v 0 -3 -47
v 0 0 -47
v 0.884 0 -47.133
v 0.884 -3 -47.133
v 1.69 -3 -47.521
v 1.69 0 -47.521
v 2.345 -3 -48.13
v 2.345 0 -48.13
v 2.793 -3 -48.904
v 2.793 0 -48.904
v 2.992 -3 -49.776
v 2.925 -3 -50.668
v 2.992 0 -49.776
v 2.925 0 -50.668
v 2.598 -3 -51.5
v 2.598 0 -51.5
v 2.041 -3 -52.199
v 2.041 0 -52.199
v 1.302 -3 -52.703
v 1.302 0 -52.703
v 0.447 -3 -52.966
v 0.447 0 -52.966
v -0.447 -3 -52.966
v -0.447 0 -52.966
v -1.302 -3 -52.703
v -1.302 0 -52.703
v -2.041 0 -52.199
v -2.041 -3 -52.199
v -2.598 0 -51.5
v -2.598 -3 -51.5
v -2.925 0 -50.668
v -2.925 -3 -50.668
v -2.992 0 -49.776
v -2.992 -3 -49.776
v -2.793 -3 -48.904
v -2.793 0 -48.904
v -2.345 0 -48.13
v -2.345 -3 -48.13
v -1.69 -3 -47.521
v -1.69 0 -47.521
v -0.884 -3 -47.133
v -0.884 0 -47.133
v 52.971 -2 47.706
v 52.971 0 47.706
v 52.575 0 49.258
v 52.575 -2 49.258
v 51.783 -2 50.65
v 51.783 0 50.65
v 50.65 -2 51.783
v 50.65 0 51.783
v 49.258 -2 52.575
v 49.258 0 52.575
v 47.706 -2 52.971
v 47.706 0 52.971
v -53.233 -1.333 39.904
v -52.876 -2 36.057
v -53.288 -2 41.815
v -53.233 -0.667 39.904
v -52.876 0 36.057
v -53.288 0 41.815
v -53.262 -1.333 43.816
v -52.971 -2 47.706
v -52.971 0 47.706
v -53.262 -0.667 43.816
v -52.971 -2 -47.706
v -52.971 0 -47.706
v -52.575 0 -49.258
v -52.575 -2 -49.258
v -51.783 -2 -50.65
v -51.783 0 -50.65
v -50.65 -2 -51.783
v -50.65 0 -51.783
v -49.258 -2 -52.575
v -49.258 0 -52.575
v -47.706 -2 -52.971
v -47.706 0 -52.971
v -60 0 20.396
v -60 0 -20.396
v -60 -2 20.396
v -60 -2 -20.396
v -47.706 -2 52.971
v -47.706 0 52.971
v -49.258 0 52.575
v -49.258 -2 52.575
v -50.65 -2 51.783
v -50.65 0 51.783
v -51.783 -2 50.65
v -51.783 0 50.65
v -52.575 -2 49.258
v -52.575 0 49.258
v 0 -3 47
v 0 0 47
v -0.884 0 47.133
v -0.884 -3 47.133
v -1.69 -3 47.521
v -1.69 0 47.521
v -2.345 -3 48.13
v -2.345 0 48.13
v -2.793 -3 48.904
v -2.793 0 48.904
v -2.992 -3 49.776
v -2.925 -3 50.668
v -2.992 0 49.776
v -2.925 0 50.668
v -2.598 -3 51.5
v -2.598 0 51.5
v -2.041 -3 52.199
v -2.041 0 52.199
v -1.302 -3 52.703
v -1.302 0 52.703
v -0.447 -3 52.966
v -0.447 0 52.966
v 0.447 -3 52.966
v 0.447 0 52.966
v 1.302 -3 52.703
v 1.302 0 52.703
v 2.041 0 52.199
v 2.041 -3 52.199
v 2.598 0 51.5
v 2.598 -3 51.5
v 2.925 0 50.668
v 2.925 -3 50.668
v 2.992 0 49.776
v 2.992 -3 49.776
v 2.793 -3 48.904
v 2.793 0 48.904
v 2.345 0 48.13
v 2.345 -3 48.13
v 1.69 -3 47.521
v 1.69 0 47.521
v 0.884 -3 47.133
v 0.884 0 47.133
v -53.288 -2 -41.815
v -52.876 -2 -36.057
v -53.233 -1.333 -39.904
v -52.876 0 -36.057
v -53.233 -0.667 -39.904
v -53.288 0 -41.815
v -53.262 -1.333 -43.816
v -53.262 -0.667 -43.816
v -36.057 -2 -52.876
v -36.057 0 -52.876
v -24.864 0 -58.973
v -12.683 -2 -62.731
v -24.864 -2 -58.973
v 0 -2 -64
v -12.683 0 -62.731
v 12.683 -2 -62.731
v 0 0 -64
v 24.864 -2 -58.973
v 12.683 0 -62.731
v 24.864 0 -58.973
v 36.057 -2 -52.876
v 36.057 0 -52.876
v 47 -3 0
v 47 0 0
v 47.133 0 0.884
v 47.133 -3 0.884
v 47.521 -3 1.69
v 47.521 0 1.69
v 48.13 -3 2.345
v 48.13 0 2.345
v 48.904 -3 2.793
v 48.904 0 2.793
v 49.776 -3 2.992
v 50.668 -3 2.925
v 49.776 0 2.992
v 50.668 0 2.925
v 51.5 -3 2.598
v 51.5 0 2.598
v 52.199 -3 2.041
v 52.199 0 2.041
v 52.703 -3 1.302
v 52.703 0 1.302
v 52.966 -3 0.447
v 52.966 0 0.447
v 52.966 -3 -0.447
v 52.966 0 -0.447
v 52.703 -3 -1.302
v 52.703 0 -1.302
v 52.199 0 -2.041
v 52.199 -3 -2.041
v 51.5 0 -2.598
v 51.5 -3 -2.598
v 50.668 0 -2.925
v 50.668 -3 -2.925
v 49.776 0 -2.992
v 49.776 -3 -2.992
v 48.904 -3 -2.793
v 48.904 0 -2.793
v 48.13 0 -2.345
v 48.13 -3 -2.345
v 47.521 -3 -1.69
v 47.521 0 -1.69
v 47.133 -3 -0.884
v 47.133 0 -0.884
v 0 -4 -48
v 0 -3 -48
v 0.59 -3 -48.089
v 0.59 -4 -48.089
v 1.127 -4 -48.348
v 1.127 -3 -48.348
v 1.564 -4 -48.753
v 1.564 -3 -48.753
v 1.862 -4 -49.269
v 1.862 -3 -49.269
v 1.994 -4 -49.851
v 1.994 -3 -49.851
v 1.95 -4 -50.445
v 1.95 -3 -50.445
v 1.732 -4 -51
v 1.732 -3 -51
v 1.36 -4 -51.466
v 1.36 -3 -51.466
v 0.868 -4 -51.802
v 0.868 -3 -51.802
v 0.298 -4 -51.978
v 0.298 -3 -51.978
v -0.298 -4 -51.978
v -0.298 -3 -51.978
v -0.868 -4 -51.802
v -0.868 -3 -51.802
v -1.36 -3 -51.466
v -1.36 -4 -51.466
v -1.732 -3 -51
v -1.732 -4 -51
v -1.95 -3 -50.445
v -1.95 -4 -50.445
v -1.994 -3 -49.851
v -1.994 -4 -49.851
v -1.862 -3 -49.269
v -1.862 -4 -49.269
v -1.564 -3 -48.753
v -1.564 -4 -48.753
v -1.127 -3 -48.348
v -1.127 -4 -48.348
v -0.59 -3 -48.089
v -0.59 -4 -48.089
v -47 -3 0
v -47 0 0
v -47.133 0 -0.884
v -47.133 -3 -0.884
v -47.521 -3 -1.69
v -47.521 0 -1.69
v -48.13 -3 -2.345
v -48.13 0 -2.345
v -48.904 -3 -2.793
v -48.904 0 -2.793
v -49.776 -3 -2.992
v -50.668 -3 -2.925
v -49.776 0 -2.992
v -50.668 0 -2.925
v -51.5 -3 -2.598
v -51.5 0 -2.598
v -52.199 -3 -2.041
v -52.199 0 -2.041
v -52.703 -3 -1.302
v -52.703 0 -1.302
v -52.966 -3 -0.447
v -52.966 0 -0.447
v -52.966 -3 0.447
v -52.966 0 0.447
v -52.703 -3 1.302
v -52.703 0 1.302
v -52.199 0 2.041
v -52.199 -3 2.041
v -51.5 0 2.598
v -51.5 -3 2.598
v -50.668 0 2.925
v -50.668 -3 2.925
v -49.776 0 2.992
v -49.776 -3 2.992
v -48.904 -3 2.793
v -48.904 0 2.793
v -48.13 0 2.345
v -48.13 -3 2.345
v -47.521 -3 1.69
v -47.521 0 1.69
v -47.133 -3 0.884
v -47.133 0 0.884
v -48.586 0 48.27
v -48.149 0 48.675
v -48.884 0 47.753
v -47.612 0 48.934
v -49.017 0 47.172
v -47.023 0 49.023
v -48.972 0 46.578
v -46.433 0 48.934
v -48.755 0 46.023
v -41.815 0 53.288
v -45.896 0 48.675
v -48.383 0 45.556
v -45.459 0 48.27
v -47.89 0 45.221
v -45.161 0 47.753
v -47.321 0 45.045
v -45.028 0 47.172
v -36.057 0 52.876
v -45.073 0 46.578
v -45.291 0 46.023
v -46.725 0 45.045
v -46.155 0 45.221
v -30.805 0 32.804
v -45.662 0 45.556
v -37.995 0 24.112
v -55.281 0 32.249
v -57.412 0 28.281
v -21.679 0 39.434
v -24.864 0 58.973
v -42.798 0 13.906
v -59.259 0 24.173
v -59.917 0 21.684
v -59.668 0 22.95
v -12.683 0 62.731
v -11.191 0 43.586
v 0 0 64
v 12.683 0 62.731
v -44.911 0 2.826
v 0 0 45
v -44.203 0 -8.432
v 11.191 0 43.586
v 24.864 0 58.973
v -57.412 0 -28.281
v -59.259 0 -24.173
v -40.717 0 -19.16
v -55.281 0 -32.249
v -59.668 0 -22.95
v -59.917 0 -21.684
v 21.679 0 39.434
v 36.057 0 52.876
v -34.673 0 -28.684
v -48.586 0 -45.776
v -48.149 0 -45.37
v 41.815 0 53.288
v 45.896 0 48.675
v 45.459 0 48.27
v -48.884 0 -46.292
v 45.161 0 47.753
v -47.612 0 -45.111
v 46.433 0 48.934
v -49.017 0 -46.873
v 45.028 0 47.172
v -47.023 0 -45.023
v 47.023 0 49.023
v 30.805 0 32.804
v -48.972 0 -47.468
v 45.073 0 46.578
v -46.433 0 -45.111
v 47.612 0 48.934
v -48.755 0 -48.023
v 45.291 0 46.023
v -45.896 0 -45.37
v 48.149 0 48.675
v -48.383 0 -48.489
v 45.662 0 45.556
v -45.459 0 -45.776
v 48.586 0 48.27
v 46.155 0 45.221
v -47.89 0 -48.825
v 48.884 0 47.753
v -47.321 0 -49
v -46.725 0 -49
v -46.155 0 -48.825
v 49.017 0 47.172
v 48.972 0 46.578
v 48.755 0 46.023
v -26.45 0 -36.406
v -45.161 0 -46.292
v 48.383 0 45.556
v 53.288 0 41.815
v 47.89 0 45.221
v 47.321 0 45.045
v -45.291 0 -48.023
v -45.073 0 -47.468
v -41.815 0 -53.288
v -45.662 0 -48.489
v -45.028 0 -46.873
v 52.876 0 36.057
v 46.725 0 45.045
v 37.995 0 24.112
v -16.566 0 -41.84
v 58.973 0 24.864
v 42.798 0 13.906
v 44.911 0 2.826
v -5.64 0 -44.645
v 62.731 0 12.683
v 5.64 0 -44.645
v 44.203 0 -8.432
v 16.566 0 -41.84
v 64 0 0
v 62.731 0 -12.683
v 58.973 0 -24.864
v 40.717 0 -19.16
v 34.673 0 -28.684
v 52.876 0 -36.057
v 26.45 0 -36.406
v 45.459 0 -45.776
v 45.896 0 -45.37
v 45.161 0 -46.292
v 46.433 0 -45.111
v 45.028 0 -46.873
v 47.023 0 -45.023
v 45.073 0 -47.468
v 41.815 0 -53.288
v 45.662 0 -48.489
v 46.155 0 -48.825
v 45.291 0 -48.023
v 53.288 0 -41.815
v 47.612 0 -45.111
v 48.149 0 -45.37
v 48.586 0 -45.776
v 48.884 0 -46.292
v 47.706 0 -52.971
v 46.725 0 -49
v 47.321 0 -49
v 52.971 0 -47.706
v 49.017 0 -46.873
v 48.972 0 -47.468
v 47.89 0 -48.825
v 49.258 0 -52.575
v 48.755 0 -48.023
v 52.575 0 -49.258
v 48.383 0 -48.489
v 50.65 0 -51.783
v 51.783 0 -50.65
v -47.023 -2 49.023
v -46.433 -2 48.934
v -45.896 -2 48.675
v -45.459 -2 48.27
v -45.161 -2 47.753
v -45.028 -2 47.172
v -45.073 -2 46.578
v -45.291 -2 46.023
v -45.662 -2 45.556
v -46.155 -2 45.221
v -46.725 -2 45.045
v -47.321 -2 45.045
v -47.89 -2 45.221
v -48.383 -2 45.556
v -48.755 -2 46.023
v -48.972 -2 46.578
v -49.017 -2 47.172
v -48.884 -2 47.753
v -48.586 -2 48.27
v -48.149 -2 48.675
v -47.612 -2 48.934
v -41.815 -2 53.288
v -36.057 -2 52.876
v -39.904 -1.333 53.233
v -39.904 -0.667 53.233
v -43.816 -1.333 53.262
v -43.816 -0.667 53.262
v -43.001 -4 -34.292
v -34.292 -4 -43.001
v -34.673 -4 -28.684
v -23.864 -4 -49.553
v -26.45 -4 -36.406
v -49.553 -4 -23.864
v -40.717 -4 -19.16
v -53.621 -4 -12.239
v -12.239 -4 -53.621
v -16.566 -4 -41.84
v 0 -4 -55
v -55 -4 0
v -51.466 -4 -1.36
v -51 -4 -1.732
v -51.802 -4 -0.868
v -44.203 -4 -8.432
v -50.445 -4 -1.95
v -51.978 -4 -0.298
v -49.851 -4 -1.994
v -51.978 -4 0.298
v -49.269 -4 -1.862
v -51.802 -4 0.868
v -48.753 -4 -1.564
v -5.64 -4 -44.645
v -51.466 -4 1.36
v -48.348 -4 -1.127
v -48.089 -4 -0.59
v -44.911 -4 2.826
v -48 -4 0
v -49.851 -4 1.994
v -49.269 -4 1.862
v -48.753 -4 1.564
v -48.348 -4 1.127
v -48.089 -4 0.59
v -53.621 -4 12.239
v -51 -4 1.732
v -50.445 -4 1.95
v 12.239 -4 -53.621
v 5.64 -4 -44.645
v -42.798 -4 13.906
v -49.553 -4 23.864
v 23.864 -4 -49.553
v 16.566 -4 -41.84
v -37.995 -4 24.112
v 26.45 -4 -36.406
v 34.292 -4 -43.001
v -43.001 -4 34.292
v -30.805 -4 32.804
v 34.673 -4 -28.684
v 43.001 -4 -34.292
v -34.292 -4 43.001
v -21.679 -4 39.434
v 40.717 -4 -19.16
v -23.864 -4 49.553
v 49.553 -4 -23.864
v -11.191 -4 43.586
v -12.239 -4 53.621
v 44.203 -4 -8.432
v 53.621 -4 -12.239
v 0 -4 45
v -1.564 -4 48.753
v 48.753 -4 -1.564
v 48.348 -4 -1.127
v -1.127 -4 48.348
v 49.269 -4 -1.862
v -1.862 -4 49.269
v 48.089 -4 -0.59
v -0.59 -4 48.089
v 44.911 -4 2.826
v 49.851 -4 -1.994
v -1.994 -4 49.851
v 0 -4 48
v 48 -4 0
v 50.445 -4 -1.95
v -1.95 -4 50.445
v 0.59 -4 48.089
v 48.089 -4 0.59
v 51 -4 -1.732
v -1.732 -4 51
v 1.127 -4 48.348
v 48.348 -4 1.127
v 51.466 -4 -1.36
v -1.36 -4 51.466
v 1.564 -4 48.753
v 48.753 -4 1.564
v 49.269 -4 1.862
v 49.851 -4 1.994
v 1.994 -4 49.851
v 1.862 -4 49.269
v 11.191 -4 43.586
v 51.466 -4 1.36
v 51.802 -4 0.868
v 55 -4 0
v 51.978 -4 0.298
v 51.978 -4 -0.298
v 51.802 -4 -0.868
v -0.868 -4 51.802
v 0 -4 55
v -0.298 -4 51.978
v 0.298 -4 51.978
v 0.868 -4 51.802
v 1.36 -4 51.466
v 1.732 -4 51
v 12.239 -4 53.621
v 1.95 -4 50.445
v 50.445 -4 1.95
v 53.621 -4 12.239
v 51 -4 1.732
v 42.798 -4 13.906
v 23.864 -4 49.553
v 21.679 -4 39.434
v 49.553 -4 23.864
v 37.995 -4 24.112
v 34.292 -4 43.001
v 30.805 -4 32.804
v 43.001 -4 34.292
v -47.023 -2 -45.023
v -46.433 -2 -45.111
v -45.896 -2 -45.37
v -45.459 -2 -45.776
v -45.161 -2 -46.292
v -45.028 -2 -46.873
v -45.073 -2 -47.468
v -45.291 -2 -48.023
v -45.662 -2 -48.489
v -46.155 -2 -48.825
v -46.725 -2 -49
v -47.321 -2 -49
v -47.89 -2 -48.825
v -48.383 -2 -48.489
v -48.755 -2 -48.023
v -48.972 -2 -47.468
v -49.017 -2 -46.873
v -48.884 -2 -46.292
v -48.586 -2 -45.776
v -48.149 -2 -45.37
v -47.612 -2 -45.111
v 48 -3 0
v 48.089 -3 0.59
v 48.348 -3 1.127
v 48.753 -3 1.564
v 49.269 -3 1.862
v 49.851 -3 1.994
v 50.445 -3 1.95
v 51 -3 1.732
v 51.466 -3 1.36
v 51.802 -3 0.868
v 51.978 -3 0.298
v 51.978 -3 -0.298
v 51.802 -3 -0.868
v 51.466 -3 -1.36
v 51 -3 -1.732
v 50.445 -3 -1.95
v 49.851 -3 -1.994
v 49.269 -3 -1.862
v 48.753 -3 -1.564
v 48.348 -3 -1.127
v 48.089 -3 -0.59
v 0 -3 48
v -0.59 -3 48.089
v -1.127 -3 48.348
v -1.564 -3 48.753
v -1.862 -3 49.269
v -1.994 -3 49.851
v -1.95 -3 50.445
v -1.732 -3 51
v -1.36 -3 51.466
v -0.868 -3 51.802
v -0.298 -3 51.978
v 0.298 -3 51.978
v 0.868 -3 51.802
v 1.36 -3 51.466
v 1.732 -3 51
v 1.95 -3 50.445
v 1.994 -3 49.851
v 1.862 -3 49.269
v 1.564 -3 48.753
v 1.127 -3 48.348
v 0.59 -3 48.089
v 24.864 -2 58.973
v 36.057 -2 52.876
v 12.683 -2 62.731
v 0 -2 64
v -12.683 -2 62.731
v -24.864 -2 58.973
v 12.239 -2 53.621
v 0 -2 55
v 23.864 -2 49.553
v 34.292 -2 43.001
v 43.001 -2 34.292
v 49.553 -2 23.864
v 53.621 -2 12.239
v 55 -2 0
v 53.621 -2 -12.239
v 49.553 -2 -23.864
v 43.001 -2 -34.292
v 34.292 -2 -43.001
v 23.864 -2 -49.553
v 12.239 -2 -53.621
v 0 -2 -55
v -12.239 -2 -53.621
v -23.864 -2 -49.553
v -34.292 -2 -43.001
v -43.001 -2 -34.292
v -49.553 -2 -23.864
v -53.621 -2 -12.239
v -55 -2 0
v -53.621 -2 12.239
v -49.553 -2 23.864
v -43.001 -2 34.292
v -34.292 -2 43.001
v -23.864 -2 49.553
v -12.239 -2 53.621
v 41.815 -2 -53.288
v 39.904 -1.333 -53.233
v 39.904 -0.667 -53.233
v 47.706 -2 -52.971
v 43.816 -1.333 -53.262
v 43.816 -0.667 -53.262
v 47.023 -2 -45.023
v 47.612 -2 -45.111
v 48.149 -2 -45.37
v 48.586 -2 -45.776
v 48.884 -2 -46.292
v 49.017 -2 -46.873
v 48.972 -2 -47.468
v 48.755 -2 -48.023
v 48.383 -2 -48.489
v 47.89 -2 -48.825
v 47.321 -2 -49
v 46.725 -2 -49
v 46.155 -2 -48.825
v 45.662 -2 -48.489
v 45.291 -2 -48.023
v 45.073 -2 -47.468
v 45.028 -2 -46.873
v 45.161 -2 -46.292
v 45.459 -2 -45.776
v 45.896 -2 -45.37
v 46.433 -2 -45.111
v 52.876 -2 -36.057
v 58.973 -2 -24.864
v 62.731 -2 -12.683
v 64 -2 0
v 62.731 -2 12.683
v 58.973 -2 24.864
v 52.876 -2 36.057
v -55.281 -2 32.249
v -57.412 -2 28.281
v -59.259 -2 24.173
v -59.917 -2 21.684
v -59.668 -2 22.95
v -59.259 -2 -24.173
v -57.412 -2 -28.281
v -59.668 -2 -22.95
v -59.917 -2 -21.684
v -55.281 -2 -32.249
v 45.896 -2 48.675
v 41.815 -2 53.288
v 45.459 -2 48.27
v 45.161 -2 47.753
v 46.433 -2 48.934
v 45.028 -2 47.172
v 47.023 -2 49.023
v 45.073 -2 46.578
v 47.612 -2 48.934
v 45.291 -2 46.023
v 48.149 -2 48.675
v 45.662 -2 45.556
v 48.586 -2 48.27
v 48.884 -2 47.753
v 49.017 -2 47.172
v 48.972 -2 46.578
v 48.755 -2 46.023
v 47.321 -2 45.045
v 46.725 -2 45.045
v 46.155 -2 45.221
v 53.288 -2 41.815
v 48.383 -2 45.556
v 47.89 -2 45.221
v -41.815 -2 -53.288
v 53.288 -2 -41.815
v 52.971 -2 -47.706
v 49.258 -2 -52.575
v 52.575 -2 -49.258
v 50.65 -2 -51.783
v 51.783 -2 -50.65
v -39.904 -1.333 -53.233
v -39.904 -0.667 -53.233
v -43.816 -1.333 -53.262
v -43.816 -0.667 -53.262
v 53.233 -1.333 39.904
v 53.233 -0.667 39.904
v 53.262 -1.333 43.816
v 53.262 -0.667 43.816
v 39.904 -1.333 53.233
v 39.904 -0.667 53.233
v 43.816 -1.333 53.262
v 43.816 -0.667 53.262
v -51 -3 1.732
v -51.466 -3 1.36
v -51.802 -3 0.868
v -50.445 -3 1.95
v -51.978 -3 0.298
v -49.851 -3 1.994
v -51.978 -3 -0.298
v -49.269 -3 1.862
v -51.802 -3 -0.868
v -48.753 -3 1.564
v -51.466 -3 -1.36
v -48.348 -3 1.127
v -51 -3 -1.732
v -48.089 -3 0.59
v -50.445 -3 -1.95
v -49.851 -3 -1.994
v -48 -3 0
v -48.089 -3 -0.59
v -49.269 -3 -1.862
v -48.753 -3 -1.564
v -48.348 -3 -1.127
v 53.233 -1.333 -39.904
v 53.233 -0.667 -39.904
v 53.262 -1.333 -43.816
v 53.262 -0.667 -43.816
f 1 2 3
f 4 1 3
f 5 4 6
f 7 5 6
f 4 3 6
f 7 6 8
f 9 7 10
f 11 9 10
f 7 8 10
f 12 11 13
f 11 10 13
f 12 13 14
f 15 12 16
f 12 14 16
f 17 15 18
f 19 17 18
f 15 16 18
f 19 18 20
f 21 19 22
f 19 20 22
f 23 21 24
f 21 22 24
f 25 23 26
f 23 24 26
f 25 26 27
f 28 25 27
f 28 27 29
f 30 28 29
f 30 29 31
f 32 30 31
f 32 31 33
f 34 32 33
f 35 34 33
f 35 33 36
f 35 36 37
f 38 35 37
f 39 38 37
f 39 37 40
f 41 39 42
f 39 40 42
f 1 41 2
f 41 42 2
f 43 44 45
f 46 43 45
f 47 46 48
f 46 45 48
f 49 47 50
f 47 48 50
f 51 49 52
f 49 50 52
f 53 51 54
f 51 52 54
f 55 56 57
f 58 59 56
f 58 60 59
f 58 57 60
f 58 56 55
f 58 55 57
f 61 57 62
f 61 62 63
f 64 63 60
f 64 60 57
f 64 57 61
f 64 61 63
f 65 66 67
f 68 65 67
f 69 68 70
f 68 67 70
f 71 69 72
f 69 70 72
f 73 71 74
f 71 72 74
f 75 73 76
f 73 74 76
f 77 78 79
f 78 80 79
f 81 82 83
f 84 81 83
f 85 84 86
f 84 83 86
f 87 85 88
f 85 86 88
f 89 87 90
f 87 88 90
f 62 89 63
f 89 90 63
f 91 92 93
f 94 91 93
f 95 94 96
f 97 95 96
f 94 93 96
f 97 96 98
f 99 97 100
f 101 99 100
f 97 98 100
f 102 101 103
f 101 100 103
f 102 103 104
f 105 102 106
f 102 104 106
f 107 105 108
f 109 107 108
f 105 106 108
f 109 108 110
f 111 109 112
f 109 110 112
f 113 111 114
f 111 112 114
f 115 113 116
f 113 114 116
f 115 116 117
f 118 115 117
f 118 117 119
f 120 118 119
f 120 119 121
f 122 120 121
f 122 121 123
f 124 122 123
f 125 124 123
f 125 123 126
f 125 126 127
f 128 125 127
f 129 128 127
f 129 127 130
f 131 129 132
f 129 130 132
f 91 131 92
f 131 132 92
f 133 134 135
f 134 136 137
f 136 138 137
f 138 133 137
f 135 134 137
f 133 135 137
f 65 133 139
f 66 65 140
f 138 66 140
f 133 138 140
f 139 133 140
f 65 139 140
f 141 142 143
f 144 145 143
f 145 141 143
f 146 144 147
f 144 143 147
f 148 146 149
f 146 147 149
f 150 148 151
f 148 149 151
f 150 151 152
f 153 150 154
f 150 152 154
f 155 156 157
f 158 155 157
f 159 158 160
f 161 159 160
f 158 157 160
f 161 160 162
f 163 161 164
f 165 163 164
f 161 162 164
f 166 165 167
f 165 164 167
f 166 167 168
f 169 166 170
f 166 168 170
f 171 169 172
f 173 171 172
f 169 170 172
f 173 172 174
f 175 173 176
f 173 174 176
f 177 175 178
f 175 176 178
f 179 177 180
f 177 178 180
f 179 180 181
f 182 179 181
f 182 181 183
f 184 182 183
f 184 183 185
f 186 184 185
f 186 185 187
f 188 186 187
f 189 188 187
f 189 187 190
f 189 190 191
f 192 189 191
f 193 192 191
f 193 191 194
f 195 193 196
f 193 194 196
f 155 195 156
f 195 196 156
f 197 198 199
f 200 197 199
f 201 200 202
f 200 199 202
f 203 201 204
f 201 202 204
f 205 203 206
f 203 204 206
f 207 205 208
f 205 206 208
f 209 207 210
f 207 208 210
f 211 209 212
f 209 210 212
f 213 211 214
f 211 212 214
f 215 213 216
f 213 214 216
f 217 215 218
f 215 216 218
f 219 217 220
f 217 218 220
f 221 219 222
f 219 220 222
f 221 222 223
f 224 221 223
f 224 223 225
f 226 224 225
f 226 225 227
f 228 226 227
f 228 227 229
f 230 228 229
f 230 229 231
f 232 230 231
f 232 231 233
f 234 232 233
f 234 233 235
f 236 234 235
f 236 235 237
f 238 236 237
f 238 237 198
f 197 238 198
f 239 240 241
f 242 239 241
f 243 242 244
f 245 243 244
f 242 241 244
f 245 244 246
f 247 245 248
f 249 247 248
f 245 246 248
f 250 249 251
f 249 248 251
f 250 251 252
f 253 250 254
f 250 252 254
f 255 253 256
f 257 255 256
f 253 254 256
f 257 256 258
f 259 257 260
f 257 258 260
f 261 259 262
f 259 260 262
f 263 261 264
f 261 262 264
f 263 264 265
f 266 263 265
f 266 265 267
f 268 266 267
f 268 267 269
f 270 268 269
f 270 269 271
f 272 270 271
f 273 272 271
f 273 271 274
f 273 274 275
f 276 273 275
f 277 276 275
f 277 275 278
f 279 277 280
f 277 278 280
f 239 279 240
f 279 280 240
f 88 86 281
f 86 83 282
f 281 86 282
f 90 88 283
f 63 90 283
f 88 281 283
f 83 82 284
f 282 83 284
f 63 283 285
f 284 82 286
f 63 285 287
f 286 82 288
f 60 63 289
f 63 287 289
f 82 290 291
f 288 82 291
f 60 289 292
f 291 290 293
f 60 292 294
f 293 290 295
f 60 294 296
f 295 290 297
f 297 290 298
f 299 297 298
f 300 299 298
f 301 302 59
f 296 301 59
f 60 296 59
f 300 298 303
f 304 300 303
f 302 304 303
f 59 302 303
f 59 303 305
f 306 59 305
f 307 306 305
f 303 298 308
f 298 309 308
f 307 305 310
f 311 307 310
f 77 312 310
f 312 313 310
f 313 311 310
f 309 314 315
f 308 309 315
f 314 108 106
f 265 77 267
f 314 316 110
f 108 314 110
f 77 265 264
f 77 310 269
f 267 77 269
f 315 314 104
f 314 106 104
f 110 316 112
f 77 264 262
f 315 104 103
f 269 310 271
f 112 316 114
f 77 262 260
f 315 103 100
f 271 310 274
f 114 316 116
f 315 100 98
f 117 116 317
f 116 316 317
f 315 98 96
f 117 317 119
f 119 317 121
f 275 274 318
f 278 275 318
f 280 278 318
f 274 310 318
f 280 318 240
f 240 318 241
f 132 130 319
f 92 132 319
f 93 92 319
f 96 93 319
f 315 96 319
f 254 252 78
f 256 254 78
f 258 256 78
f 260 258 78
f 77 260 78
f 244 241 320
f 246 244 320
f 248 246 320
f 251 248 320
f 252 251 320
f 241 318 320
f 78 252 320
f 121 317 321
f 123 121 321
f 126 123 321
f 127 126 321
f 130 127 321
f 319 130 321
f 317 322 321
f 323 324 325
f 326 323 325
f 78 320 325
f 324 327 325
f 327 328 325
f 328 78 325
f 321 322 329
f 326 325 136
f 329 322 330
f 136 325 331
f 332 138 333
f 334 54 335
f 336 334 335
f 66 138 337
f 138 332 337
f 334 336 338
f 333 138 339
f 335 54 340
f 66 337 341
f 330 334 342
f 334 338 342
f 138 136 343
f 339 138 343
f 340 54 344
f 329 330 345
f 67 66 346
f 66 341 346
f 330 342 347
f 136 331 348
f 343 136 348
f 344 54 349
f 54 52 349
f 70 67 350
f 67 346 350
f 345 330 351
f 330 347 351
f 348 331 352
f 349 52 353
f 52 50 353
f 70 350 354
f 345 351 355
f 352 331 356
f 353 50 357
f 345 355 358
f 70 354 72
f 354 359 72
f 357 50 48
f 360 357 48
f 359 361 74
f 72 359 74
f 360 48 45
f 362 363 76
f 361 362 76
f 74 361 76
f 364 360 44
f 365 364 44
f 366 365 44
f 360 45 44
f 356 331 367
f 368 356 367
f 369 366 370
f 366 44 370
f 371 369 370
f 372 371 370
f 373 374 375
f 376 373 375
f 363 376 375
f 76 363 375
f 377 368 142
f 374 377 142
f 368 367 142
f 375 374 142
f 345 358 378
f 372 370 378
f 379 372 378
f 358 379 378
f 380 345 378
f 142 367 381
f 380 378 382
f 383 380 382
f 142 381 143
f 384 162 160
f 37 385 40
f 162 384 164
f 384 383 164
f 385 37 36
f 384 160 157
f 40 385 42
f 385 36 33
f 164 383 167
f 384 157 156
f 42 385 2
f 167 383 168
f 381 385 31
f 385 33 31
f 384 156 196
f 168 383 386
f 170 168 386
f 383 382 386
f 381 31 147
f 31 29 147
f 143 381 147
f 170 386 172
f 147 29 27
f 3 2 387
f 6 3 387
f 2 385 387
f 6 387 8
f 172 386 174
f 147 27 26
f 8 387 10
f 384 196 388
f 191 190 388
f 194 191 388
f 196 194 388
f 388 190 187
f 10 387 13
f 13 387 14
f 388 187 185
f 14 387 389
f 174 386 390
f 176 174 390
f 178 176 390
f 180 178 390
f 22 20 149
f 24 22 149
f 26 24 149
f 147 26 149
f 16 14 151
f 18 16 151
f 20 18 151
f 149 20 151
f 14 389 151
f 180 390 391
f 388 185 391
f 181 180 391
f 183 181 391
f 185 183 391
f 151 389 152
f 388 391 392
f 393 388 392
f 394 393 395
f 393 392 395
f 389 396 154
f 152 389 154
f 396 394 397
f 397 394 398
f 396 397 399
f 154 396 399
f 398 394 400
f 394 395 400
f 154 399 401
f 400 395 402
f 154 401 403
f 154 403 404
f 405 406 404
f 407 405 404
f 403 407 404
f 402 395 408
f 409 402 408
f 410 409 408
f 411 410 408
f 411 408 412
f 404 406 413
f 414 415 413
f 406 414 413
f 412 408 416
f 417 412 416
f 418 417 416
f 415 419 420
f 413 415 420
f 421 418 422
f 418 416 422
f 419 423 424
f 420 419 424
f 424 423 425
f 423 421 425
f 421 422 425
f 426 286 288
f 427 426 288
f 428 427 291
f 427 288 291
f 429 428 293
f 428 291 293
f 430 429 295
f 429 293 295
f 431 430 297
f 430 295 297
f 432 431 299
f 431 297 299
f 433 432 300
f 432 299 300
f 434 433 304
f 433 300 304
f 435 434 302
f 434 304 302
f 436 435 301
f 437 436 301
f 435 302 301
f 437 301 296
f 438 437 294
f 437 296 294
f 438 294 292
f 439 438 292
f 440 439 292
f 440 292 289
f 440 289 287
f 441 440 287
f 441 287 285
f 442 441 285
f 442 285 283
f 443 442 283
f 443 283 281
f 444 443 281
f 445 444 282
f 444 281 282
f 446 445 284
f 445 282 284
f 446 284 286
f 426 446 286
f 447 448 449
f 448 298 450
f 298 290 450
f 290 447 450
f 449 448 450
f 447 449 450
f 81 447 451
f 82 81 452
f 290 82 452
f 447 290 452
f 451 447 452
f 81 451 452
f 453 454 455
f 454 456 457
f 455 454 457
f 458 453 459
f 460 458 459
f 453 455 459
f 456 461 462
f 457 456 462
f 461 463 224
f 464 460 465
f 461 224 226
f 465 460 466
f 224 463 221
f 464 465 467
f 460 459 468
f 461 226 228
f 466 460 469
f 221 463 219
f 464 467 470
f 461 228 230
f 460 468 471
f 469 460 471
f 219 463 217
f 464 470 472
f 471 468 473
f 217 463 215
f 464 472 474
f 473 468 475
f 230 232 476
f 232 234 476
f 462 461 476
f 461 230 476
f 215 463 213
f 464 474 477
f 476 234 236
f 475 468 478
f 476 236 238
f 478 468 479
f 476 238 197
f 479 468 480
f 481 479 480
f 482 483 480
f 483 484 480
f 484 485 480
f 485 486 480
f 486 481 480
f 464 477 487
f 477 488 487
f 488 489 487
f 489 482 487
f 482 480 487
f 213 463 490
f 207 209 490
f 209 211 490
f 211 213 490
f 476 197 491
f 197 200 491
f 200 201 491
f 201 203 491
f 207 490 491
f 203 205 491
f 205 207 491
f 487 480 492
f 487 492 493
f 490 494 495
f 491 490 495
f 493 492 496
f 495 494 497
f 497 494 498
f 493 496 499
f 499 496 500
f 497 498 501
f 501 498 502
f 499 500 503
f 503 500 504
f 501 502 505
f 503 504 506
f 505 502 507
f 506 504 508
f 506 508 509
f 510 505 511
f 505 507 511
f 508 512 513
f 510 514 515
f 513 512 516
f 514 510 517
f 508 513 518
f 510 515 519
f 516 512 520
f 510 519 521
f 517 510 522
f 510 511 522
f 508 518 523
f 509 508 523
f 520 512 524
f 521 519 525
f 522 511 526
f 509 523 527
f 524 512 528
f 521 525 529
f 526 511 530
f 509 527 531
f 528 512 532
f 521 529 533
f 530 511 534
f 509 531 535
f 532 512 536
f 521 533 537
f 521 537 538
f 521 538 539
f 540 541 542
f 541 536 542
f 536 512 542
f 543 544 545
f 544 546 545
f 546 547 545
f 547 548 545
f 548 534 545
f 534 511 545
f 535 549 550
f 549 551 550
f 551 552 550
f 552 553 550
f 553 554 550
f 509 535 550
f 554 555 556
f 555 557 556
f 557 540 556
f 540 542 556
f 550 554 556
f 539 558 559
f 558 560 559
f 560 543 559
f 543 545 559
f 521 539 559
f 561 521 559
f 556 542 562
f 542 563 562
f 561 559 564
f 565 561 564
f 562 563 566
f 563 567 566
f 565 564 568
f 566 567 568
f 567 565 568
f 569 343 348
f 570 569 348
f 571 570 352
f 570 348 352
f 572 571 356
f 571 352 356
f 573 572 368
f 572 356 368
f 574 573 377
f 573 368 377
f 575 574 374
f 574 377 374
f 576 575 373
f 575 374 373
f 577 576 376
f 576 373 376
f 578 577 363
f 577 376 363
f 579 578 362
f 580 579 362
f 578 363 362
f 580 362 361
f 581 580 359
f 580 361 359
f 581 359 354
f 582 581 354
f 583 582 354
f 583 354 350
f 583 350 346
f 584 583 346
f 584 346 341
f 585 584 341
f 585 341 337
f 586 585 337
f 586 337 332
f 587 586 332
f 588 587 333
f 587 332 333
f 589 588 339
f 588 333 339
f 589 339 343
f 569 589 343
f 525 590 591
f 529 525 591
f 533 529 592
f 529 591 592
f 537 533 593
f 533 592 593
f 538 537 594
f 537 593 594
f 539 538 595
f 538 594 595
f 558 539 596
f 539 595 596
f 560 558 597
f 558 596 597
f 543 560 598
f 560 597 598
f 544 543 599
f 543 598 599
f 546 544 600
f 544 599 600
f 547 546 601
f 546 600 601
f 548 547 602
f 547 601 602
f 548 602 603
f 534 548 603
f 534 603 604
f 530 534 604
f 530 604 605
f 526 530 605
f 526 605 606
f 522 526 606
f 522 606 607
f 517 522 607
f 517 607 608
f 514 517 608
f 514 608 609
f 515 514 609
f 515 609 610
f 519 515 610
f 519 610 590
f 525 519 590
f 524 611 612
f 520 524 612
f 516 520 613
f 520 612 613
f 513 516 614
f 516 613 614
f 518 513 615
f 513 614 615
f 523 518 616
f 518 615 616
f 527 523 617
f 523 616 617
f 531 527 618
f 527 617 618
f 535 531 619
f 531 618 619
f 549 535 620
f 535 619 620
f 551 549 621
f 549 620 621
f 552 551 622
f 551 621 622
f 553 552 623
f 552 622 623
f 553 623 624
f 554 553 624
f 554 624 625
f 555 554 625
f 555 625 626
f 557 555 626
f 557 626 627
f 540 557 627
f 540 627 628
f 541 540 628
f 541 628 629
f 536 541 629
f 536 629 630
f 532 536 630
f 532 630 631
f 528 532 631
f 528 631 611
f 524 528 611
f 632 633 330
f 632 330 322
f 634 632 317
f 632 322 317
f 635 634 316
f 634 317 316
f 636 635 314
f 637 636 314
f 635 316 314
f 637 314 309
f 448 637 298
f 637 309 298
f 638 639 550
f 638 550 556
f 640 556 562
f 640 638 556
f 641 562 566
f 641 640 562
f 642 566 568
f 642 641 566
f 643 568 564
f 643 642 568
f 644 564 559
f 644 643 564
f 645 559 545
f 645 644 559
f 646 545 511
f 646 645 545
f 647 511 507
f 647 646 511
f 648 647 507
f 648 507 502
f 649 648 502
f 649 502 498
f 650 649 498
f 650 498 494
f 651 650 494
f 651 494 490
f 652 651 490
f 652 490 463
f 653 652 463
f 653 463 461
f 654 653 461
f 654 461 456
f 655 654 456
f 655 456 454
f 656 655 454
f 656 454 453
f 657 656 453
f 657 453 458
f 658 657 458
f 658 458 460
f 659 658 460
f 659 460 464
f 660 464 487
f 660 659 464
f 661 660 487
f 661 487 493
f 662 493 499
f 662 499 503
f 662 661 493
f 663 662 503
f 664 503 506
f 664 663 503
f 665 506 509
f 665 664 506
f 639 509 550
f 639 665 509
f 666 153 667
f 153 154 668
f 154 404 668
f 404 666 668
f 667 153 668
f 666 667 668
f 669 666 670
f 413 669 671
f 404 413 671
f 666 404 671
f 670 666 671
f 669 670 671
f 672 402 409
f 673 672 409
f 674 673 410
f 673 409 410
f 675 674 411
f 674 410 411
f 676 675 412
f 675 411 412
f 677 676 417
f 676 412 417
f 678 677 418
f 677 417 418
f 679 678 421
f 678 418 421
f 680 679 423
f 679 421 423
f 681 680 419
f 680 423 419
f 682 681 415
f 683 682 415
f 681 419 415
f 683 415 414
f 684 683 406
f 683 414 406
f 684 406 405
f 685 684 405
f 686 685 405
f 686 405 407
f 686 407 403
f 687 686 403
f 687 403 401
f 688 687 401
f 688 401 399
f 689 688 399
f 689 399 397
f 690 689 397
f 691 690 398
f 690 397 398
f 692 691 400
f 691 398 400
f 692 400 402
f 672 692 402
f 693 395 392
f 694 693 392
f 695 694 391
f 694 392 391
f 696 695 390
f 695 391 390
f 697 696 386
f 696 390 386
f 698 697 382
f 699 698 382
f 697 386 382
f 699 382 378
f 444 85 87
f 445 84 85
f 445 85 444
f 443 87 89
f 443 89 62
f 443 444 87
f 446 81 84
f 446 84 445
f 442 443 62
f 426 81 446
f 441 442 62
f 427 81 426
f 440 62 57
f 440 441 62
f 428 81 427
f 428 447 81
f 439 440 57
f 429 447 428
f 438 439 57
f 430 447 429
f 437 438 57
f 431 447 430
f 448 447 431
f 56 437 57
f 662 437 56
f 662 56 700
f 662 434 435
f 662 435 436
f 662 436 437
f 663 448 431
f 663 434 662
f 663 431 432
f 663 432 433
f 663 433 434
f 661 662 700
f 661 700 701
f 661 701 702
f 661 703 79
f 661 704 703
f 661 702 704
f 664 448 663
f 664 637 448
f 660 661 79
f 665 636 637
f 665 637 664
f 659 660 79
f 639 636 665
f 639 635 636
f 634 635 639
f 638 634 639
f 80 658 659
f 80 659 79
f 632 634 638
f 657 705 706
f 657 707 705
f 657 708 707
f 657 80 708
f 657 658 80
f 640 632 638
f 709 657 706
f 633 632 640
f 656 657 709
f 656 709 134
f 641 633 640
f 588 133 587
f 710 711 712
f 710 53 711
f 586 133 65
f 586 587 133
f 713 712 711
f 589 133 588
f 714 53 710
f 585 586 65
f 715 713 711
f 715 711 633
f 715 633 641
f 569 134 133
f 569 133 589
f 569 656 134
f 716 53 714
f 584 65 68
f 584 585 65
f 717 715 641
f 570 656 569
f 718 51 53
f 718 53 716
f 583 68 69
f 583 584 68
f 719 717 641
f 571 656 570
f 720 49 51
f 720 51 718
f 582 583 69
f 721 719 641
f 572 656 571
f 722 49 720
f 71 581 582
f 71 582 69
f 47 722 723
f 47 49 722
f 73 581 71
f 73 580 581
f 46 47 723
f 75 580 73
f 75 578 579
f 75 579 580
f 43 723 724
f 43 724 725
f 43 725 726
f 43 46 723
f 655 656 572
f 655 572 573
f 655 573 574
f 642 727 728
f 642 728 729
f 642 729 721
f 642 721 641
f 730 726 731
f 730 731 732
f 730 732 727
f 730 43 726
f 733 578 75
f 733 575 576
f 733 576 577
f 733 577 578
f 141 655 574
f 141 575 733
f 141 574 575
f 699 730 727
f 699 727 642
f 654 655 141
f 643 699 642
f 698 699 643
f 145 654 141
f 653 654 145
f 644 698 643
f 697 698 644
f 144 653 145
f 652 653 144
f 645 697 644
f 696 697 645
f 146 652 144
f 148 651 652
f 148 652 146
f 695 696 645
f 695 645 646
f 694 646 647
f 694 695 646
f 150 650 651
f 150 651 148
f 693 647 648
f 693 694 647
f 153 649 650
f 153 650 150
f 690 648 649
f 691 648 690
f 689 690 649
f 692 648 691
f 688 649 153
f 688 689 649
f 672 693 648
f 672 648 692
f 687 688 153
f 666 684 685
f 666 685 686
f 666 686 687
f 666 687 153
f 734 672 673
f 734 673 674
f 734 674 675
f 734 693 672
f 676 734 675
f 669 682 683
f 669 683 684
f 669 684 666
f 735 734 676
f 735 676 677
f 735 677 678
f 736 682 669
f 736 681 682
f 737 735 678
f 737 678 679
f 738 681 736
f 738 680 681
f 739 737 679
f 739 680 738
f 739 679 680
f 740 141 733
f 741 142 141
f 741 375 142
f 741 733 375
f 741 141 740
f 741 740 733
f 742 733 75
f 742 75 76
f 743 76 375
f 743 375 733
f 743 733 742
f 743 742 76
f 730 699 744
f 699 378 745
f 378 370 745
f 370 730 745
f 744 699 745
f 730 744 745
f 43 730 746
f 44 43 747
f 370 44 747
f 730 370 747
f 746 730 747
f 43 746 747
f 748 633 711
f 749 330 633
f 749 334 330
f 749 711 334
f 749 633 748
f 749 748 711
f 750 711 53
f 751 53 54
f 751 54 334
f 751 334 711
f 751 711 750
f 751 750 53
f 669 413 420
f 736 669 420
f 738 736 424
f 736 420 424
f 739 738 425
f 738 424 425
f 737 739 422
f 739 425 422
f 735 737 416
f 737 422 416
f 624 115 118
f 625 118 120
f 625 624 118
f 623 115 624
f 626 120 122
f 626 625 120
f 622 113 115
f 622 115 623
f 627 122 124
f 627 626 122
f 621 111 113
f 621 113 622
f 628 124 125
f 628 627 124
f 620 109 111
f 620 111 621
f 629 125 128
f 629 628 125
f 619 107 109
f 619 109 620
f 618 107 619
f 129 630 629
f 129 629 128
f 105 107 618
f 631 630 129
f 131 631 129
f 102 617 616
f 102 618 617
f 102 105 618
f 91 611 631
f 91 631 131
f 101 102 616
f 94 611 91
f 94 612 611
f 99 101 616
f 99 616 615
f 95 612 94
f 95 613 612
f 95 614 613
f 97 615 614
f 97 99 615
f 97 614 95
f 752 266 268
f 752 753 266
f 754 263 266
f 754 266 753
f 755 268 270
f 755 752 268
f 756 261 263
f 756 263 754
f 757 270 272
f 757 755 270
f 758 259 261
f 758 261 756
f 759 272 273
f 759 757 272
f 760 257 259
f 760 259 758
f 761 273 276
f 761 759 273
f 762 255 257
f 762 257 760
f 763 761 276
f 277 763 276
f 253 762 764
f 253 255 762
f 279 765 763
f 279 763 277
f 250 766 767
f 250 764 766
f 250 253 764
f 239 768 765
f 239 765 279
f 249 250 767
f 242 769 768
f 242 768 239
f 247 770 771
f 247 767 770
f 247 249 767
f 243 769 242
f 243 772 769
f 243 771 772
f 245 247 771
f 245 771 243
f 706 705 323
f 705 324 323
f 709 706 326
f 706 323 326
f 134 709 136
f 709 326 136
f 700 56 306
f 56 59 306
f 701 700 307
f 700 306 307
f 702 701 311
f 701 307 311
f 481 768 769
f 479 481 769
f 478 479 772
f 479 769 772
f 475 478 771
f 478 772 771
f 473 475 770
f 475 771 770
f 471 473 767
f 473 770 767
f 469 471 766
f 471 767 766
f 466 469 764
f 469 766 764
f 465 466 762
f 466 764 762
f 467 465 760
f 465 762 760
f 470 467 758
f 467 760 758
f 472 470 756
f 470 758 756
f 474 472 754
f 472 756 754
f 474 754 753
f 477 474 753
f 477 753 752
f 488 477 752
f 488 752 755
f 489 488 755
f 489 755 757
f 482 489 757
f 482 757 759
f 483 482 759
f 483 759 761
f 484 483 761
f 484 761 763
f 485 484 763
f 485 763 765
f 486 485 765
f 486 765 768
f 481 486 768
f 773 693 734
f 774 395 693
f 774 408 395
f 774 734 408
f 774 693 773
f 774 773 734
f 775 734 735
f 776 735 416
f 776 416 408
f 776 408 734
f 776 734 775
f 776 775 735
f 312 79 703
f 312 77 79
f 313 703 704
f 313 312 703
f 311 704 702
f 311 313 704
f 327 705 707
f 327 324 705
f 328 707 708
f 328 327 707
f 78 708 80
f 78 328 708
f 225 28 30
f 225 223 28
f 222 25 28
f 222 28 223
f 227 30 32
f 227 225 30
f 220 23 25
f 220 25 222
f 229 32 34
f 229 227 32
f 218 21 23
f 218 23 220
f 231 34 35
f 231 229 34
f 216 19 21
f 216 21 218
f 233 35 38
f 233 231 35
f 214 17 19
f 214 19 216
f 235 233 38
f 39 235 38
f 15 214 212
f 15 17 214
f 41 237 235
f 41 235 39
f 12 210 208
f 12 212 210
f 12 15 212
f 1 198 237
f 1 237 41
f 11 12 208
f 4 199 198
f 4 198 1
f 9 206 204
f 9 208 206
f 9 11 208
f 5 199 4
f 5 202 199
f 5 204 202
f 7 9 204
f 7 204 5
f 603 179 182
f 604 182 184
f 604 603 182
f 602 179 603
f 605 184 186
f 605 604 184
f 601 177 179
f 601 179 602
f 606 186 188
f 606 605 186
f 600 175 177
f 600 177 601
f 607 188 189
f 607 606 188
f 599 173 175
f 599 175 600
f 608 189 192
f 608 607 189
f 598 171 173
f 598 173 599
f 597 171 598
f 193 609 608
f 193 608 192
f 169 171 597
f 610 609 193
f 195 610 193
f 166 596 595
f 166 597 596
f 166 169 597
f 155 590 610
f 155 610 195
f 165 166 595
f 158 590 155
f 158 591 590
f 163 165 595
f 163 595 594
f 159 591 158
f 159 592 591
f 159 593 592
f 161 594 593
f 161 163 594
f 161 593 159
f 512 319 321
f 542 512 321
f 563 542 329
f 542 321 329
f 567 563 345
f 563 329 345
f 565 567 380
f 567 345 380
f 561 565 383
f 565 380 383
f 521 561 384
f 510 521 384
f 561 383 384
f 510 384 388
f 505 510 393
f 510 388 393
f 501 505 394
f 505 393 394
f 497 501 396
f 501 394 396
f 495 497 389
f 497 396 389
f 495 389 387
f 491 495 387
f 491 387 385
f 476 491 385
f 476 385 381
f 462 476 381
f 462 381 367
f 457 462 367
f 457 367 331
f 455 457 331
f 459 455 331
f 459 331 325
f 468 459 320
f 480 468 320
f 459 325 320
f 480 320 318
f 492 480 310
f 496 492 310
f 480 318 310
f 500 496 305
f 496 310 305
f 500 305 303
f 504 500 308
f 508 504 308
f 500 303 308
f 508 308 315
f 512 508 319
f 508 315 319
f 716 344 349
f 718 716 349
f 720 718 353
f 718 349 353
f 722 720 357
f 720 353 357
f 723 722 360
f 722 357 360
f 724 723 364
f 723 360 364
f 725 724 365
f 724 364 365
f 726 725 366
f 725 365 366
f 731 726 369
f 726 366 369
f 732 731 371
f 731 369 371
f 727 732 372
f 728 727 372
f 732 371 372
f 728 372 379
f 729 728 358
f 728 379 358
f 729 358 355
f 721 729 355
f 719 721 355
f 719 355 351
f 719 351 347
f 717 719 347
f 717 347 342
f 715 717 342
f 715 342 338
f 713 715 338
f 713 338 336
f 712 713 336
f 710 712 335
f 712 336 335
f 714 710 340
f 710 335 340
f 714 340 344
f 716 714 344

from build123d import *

# Parameters (mm, degrees)
SKETCH_1_R               = 55
SKETCH_1_R_2             = 45
EXTRUDE_1_DEPTH          = 4
EXTRUDE_START            = -4
SKETCH_2_R               = 64
SKETCH_2_R_2             = 55
EXTRUDE_2_DEPTH          = 2
SKETCH_3_R               = 3
CUT_EXTRUDE_1_DEPTH      = 3
PATTERN_CIRCULAR_1_COUNT = 4
SKETCH_4_R               = 2
CUT_EXTRUDE_2_DEPTH      = 91.559372789
PATTERN_CIRCULAR_2_COUNT = 4
SKETCH_5_R               = 2
EXTRUDE_3_DEPTH          = 2
CUT_EXTRUDE_3_DEPTH      = 91.598013365
CUT_EXTRUDE_3_DEPTH_BACK = 91.598013365
FILLET_1_R               = 10


with BuildPart() as part:
    # 草图1 → 凸台-拉伸1 (new body)
    with BuildSketch(Plane(origin=(0, 0, 0), x_dir=(1, 0, 0), z_dir=(0, 1, 0))):
        with Locations(Location((0, 0, 0), (0, 0, 270))):
            Circle(SKETCH_1_R)
        with Locations(Location((0, 0, 0), (0, 0, 270))):
            Circle(SKETCH_1_R_2, mode=Mode.SUBTRACT)
    extrude(amount=-EXTRUDE_1_DEPTH)

    # 草图2 → 凸台-拉伸2 (add)
    with BuildSketch(Plane(origin=(0, -4, 0), x_dir=(-1, 0, 0), z_dir=(0, -1, 0)).offset(EXTRUDE_START)):
        with Locations(Location((0, 0, 0), (0, 0, 90))):
            Circle(SKETCH_2_R)
        with Locations(Location((0, 0, 0), (0, 0, 270))):
            Circle(SKETCH_2_R_2, mode=Mode.SUBTRACT)
    extrude(amount=EXTRUDE_2_DEPTH)

    # 草图3 → 切除-拉伸1 (cut)
    with BuildSketch(Plane(origin=(0, 0, 0), x_dir=(1, 0, 0), z_dir=(0, 1, 0))):
        with Locations(Location((0, 50, 0), (0, 0, 270))):
            Circle(SKETCH_3_R)
    cut_extrude_1 = extrude(amount=-CUT_EXTRUDE_1_DEPTH, mode=Mode.SUBTRACT)

    # 阵列(圆周)1: 切除-拉伸1 ×4 about axis
    pattern_circular_1_axis = Axis((0, 0, 0), (0, 1, 0))
    for i in range(1, PATTERN_CIRCULAR_1_COUNT):
        add(cut_extrude_1.rotate(pattern_circular_1_axis, i * 360 / PATTERN_CIRCULAR_1_COUNT), mode=Mode.SUBTRACT)

    # 草图4 → 切除-拉伸2 (cut, through all)
    with BuildSketch(Plane(origin=(0, -3, 0), x_dir=(1, 0, 0), z_dir=(0, 1, 0))):
        with Locations(Location((0, 50, 0), (0, 0, 270))):
            Circle(SKETCH_4_R)
    cut_extrude_2 = extrude(amount=-CUT_EXTRUDE_2_DEPTH, mode=Mode.SUBTRACT)

    # 阵列(圆周)2: 切除-拉伸2 ×4 about axis
    pattern_circular_2_axis = Axis((0, 0, 0), (0, 1, 0))
    for i in range(1, PATTERN_CIRCULAR_2_COUNT):
        add(cut_extrude_2.rotate(pattern_circular_2_axis, i * 360 / PATTERN_CIRCULAR_2_COUNT), mode=Mode.SUBTRACT)

    # 草图5 → 凸台-拉伸3 (add)
    # profile 1 of 4: a face of its own
    with BuildSketch(Plane(origin=(0, 0, 0), x_dir=(1, 0, 0), z_dir=(0, 1, 0))):
        with BuildLine():
            ThreePointArc((47.70579193, 52.971441059), (51.25436151, 51.25436151), (52.971441059, 47.70579193))
            add(Edge.make_bspline(
                [(52.875879568, 36.057473011), (53.400264575, 39.842208211), (53.419874183, 43.855270087), (52.971441059, 47.70579193)],
                knots=[0, 0, 0, 0, 0.718259979, 0.718259979, 0.718259979, 0.718259979], degree=3))
            ThreePointArc((52.875879568, 36.057473011), (45.254833996, 45.254833996), (36.057473011, 52.875879568))
            add(Edge.make_bspline(
                [(36.057473011, 52.875879568), (39.842208211, 53.400264575), (43.855270087, 53.419874183), (47.70579193, 52.971441059)],
                knots=[0, 0, 0, 0, 0.718259979, 0.718259979, 0.718259979, 0.718259979], degree=3))
        make_face()
        with Locations(Location((47.022600949, 47.022600949, 0), (0, 0, 270))):
            Circle(SKETCH_5_R, mode=Mode.SUBTRACT)
    # profile 2 of 4: a face of its own
    with BuildSketch(Plane(origin=(0, 0, 0), x_dir=(1, 0, 0), z_dir=(0, 1, 0))):
        with BuildLine():
            ThreePointArc((52.971441059, -47.70579193), (51.25436151, -51.25436151), (47.70579193, -52.971441059))
            add(Edge.make_bspline(
                [(36.057473011, -52.875879568), (39.842208211, -53.400264575), (43.855270087, -53.419874183), (47.70579193, -52.971441059)],
                knots=[0, 0, 0, 0, 0.718259979, 0.718259979, 0.718259979, 0.718259979], degree=3))
            ThreePointArc((36.057473011, -52.875879568), (45.254833996, -45.254833996), (52.875879568, -36.057473011))
            add(Edge.make_bspline(
                [(52.875879568, -36.057473011), (53.400264575, -39.842208211), (53.419874183, -43.855270087), (52.971441059, -47.70579193)],
                knots=[0, 0, 0, 0, 0.718259979, 0.718259979, 0.718259979, 0.718259979], degree=3))
        make_face()
        with Locations(Location((47.022600949, -47.022600949, 0), (0, 0, 270))):
            Circle(SKETCH_5_R, mode=Mode.SUBTRACT)
    # profile 3 of 4: a face of its own
    with BuildSketch(Plane(origin=(0, 0, 0), x_dir=(1, 0, 0), z_dir=(0, 1, 0))):
        with BuildLine():
            ThreePointArc((-47.70579193, -52.971441059), (-51.25436151, -51.25436151), (-52.971441059, -47.70579193))
            add(Edge.make_bspline(
                [(-52.875879568, -36.057473011), (-53.400264576, -39.842208211), (-53.419874183, -43.855270087), (-52.971441059, -47.70579193)],
                knots=[0, 0, 0, 0, 0.718259979, 0.718259979, 0.718259979, 0.718259979], degree=3))
            ThreePointArc((-52.875879568, -36.057473011), (-45.254833996, -45.254833996), (-36.057473011, -52.875879568))
            add(Edge.make_bspline(
                [(-36.057473011, -52.875879568), (-39.842208211, -53.400264575), (-43.855270087, -53.419874183), (-47.70579193, -52.971441059)],
                knots=[0, 0, 0, 0, 0.718259979, 0.718259979, 0.718259979, 0.718259979], degree=3))
        make_face()
        with Locations(Location((-47.022600949, -47.022600949, 0), (0, 0, 270))):
            Circle(SKETCH_5_R, mode=Mode.SUBTRACT)
    # profile 4 of 4: a face of its own
    with BuildSketch(Plane(origin=(0, 0, 0), x_dir=(1, 0, 0), z_dir=(0, 1, 0))):
        with BuildLine():
            ThreePointArc((-52.971441059, 47.70579193), (-51.25436151, 51.25436151), (-47.70579193, 52.971441059))
            add(Edge.make_bspline(
                [(-36.057473011, 52.875879568), (-39.842208211, 53.400264576), (-43.855270087, 53.419874183), (-47.70579193, 52.971441059)],
                knots=[0, 0, 0, 0, 0.718259979, 0.718259979, 0.718259979, 0.718259979], degree=3))
            ThreePointArc((-36.057473011, 52.875879568), (-45.254833996, 45.254833996), (-52.875879568, 36.057473011))
            add(Edge.make_bspline(
                [(-52.875879568, 36.057473011), (-53.400264575, 39.842208211), (-53.419874183, 43.855270087), (-52.971441059, 47.70579193)],
                knots=[0, 0, 0, 0, 0.718259979, 0.718259979, 0.718259979, 0.718259979], degree=3))
        make_face()
        with Locations(Location((-47.022600949, 47.022600949, 0), (0, 0, 270))):
            Circle(SKETCH_5_R, mode=Mode.SUBTRACT)
    extrude(amount=-EXTRUDE_3_DEPTH)

    # 草图6 → 切除-拉伸3 (cut, two sides: drawn at the far end of the back side and taken through both)
    with BuildSketch(Plane(origin=(0, 0, 0), x_dir=(1, 0, 0), z_dir=(0, 1, 0)).offset(-CUT_EXTRUDE_3_DEPTH_BACK)):
        Polygon((-60, 26.714394046), (-60, -26.64509416), (-76.414310547, -26.64509416), (-74.893876556, 32.809859769), align=None)
    extrude(amount=CUT_EXTRUDE_3_DEPTH + CUT_EXTRUDE_3_DEPTH_BACK, mode=Mode.SUBTRACT)

    # 圆角1
    fillet_1_edges = [part.edges().sort_by_distance(p)[0] for p in [
        (-60, -1, 22.271057451),
        (-60, -1, -22.271057451),
    ]]
    fillet(fillet_1_edges, radius=FILLET_1_R)


solid = part.part
